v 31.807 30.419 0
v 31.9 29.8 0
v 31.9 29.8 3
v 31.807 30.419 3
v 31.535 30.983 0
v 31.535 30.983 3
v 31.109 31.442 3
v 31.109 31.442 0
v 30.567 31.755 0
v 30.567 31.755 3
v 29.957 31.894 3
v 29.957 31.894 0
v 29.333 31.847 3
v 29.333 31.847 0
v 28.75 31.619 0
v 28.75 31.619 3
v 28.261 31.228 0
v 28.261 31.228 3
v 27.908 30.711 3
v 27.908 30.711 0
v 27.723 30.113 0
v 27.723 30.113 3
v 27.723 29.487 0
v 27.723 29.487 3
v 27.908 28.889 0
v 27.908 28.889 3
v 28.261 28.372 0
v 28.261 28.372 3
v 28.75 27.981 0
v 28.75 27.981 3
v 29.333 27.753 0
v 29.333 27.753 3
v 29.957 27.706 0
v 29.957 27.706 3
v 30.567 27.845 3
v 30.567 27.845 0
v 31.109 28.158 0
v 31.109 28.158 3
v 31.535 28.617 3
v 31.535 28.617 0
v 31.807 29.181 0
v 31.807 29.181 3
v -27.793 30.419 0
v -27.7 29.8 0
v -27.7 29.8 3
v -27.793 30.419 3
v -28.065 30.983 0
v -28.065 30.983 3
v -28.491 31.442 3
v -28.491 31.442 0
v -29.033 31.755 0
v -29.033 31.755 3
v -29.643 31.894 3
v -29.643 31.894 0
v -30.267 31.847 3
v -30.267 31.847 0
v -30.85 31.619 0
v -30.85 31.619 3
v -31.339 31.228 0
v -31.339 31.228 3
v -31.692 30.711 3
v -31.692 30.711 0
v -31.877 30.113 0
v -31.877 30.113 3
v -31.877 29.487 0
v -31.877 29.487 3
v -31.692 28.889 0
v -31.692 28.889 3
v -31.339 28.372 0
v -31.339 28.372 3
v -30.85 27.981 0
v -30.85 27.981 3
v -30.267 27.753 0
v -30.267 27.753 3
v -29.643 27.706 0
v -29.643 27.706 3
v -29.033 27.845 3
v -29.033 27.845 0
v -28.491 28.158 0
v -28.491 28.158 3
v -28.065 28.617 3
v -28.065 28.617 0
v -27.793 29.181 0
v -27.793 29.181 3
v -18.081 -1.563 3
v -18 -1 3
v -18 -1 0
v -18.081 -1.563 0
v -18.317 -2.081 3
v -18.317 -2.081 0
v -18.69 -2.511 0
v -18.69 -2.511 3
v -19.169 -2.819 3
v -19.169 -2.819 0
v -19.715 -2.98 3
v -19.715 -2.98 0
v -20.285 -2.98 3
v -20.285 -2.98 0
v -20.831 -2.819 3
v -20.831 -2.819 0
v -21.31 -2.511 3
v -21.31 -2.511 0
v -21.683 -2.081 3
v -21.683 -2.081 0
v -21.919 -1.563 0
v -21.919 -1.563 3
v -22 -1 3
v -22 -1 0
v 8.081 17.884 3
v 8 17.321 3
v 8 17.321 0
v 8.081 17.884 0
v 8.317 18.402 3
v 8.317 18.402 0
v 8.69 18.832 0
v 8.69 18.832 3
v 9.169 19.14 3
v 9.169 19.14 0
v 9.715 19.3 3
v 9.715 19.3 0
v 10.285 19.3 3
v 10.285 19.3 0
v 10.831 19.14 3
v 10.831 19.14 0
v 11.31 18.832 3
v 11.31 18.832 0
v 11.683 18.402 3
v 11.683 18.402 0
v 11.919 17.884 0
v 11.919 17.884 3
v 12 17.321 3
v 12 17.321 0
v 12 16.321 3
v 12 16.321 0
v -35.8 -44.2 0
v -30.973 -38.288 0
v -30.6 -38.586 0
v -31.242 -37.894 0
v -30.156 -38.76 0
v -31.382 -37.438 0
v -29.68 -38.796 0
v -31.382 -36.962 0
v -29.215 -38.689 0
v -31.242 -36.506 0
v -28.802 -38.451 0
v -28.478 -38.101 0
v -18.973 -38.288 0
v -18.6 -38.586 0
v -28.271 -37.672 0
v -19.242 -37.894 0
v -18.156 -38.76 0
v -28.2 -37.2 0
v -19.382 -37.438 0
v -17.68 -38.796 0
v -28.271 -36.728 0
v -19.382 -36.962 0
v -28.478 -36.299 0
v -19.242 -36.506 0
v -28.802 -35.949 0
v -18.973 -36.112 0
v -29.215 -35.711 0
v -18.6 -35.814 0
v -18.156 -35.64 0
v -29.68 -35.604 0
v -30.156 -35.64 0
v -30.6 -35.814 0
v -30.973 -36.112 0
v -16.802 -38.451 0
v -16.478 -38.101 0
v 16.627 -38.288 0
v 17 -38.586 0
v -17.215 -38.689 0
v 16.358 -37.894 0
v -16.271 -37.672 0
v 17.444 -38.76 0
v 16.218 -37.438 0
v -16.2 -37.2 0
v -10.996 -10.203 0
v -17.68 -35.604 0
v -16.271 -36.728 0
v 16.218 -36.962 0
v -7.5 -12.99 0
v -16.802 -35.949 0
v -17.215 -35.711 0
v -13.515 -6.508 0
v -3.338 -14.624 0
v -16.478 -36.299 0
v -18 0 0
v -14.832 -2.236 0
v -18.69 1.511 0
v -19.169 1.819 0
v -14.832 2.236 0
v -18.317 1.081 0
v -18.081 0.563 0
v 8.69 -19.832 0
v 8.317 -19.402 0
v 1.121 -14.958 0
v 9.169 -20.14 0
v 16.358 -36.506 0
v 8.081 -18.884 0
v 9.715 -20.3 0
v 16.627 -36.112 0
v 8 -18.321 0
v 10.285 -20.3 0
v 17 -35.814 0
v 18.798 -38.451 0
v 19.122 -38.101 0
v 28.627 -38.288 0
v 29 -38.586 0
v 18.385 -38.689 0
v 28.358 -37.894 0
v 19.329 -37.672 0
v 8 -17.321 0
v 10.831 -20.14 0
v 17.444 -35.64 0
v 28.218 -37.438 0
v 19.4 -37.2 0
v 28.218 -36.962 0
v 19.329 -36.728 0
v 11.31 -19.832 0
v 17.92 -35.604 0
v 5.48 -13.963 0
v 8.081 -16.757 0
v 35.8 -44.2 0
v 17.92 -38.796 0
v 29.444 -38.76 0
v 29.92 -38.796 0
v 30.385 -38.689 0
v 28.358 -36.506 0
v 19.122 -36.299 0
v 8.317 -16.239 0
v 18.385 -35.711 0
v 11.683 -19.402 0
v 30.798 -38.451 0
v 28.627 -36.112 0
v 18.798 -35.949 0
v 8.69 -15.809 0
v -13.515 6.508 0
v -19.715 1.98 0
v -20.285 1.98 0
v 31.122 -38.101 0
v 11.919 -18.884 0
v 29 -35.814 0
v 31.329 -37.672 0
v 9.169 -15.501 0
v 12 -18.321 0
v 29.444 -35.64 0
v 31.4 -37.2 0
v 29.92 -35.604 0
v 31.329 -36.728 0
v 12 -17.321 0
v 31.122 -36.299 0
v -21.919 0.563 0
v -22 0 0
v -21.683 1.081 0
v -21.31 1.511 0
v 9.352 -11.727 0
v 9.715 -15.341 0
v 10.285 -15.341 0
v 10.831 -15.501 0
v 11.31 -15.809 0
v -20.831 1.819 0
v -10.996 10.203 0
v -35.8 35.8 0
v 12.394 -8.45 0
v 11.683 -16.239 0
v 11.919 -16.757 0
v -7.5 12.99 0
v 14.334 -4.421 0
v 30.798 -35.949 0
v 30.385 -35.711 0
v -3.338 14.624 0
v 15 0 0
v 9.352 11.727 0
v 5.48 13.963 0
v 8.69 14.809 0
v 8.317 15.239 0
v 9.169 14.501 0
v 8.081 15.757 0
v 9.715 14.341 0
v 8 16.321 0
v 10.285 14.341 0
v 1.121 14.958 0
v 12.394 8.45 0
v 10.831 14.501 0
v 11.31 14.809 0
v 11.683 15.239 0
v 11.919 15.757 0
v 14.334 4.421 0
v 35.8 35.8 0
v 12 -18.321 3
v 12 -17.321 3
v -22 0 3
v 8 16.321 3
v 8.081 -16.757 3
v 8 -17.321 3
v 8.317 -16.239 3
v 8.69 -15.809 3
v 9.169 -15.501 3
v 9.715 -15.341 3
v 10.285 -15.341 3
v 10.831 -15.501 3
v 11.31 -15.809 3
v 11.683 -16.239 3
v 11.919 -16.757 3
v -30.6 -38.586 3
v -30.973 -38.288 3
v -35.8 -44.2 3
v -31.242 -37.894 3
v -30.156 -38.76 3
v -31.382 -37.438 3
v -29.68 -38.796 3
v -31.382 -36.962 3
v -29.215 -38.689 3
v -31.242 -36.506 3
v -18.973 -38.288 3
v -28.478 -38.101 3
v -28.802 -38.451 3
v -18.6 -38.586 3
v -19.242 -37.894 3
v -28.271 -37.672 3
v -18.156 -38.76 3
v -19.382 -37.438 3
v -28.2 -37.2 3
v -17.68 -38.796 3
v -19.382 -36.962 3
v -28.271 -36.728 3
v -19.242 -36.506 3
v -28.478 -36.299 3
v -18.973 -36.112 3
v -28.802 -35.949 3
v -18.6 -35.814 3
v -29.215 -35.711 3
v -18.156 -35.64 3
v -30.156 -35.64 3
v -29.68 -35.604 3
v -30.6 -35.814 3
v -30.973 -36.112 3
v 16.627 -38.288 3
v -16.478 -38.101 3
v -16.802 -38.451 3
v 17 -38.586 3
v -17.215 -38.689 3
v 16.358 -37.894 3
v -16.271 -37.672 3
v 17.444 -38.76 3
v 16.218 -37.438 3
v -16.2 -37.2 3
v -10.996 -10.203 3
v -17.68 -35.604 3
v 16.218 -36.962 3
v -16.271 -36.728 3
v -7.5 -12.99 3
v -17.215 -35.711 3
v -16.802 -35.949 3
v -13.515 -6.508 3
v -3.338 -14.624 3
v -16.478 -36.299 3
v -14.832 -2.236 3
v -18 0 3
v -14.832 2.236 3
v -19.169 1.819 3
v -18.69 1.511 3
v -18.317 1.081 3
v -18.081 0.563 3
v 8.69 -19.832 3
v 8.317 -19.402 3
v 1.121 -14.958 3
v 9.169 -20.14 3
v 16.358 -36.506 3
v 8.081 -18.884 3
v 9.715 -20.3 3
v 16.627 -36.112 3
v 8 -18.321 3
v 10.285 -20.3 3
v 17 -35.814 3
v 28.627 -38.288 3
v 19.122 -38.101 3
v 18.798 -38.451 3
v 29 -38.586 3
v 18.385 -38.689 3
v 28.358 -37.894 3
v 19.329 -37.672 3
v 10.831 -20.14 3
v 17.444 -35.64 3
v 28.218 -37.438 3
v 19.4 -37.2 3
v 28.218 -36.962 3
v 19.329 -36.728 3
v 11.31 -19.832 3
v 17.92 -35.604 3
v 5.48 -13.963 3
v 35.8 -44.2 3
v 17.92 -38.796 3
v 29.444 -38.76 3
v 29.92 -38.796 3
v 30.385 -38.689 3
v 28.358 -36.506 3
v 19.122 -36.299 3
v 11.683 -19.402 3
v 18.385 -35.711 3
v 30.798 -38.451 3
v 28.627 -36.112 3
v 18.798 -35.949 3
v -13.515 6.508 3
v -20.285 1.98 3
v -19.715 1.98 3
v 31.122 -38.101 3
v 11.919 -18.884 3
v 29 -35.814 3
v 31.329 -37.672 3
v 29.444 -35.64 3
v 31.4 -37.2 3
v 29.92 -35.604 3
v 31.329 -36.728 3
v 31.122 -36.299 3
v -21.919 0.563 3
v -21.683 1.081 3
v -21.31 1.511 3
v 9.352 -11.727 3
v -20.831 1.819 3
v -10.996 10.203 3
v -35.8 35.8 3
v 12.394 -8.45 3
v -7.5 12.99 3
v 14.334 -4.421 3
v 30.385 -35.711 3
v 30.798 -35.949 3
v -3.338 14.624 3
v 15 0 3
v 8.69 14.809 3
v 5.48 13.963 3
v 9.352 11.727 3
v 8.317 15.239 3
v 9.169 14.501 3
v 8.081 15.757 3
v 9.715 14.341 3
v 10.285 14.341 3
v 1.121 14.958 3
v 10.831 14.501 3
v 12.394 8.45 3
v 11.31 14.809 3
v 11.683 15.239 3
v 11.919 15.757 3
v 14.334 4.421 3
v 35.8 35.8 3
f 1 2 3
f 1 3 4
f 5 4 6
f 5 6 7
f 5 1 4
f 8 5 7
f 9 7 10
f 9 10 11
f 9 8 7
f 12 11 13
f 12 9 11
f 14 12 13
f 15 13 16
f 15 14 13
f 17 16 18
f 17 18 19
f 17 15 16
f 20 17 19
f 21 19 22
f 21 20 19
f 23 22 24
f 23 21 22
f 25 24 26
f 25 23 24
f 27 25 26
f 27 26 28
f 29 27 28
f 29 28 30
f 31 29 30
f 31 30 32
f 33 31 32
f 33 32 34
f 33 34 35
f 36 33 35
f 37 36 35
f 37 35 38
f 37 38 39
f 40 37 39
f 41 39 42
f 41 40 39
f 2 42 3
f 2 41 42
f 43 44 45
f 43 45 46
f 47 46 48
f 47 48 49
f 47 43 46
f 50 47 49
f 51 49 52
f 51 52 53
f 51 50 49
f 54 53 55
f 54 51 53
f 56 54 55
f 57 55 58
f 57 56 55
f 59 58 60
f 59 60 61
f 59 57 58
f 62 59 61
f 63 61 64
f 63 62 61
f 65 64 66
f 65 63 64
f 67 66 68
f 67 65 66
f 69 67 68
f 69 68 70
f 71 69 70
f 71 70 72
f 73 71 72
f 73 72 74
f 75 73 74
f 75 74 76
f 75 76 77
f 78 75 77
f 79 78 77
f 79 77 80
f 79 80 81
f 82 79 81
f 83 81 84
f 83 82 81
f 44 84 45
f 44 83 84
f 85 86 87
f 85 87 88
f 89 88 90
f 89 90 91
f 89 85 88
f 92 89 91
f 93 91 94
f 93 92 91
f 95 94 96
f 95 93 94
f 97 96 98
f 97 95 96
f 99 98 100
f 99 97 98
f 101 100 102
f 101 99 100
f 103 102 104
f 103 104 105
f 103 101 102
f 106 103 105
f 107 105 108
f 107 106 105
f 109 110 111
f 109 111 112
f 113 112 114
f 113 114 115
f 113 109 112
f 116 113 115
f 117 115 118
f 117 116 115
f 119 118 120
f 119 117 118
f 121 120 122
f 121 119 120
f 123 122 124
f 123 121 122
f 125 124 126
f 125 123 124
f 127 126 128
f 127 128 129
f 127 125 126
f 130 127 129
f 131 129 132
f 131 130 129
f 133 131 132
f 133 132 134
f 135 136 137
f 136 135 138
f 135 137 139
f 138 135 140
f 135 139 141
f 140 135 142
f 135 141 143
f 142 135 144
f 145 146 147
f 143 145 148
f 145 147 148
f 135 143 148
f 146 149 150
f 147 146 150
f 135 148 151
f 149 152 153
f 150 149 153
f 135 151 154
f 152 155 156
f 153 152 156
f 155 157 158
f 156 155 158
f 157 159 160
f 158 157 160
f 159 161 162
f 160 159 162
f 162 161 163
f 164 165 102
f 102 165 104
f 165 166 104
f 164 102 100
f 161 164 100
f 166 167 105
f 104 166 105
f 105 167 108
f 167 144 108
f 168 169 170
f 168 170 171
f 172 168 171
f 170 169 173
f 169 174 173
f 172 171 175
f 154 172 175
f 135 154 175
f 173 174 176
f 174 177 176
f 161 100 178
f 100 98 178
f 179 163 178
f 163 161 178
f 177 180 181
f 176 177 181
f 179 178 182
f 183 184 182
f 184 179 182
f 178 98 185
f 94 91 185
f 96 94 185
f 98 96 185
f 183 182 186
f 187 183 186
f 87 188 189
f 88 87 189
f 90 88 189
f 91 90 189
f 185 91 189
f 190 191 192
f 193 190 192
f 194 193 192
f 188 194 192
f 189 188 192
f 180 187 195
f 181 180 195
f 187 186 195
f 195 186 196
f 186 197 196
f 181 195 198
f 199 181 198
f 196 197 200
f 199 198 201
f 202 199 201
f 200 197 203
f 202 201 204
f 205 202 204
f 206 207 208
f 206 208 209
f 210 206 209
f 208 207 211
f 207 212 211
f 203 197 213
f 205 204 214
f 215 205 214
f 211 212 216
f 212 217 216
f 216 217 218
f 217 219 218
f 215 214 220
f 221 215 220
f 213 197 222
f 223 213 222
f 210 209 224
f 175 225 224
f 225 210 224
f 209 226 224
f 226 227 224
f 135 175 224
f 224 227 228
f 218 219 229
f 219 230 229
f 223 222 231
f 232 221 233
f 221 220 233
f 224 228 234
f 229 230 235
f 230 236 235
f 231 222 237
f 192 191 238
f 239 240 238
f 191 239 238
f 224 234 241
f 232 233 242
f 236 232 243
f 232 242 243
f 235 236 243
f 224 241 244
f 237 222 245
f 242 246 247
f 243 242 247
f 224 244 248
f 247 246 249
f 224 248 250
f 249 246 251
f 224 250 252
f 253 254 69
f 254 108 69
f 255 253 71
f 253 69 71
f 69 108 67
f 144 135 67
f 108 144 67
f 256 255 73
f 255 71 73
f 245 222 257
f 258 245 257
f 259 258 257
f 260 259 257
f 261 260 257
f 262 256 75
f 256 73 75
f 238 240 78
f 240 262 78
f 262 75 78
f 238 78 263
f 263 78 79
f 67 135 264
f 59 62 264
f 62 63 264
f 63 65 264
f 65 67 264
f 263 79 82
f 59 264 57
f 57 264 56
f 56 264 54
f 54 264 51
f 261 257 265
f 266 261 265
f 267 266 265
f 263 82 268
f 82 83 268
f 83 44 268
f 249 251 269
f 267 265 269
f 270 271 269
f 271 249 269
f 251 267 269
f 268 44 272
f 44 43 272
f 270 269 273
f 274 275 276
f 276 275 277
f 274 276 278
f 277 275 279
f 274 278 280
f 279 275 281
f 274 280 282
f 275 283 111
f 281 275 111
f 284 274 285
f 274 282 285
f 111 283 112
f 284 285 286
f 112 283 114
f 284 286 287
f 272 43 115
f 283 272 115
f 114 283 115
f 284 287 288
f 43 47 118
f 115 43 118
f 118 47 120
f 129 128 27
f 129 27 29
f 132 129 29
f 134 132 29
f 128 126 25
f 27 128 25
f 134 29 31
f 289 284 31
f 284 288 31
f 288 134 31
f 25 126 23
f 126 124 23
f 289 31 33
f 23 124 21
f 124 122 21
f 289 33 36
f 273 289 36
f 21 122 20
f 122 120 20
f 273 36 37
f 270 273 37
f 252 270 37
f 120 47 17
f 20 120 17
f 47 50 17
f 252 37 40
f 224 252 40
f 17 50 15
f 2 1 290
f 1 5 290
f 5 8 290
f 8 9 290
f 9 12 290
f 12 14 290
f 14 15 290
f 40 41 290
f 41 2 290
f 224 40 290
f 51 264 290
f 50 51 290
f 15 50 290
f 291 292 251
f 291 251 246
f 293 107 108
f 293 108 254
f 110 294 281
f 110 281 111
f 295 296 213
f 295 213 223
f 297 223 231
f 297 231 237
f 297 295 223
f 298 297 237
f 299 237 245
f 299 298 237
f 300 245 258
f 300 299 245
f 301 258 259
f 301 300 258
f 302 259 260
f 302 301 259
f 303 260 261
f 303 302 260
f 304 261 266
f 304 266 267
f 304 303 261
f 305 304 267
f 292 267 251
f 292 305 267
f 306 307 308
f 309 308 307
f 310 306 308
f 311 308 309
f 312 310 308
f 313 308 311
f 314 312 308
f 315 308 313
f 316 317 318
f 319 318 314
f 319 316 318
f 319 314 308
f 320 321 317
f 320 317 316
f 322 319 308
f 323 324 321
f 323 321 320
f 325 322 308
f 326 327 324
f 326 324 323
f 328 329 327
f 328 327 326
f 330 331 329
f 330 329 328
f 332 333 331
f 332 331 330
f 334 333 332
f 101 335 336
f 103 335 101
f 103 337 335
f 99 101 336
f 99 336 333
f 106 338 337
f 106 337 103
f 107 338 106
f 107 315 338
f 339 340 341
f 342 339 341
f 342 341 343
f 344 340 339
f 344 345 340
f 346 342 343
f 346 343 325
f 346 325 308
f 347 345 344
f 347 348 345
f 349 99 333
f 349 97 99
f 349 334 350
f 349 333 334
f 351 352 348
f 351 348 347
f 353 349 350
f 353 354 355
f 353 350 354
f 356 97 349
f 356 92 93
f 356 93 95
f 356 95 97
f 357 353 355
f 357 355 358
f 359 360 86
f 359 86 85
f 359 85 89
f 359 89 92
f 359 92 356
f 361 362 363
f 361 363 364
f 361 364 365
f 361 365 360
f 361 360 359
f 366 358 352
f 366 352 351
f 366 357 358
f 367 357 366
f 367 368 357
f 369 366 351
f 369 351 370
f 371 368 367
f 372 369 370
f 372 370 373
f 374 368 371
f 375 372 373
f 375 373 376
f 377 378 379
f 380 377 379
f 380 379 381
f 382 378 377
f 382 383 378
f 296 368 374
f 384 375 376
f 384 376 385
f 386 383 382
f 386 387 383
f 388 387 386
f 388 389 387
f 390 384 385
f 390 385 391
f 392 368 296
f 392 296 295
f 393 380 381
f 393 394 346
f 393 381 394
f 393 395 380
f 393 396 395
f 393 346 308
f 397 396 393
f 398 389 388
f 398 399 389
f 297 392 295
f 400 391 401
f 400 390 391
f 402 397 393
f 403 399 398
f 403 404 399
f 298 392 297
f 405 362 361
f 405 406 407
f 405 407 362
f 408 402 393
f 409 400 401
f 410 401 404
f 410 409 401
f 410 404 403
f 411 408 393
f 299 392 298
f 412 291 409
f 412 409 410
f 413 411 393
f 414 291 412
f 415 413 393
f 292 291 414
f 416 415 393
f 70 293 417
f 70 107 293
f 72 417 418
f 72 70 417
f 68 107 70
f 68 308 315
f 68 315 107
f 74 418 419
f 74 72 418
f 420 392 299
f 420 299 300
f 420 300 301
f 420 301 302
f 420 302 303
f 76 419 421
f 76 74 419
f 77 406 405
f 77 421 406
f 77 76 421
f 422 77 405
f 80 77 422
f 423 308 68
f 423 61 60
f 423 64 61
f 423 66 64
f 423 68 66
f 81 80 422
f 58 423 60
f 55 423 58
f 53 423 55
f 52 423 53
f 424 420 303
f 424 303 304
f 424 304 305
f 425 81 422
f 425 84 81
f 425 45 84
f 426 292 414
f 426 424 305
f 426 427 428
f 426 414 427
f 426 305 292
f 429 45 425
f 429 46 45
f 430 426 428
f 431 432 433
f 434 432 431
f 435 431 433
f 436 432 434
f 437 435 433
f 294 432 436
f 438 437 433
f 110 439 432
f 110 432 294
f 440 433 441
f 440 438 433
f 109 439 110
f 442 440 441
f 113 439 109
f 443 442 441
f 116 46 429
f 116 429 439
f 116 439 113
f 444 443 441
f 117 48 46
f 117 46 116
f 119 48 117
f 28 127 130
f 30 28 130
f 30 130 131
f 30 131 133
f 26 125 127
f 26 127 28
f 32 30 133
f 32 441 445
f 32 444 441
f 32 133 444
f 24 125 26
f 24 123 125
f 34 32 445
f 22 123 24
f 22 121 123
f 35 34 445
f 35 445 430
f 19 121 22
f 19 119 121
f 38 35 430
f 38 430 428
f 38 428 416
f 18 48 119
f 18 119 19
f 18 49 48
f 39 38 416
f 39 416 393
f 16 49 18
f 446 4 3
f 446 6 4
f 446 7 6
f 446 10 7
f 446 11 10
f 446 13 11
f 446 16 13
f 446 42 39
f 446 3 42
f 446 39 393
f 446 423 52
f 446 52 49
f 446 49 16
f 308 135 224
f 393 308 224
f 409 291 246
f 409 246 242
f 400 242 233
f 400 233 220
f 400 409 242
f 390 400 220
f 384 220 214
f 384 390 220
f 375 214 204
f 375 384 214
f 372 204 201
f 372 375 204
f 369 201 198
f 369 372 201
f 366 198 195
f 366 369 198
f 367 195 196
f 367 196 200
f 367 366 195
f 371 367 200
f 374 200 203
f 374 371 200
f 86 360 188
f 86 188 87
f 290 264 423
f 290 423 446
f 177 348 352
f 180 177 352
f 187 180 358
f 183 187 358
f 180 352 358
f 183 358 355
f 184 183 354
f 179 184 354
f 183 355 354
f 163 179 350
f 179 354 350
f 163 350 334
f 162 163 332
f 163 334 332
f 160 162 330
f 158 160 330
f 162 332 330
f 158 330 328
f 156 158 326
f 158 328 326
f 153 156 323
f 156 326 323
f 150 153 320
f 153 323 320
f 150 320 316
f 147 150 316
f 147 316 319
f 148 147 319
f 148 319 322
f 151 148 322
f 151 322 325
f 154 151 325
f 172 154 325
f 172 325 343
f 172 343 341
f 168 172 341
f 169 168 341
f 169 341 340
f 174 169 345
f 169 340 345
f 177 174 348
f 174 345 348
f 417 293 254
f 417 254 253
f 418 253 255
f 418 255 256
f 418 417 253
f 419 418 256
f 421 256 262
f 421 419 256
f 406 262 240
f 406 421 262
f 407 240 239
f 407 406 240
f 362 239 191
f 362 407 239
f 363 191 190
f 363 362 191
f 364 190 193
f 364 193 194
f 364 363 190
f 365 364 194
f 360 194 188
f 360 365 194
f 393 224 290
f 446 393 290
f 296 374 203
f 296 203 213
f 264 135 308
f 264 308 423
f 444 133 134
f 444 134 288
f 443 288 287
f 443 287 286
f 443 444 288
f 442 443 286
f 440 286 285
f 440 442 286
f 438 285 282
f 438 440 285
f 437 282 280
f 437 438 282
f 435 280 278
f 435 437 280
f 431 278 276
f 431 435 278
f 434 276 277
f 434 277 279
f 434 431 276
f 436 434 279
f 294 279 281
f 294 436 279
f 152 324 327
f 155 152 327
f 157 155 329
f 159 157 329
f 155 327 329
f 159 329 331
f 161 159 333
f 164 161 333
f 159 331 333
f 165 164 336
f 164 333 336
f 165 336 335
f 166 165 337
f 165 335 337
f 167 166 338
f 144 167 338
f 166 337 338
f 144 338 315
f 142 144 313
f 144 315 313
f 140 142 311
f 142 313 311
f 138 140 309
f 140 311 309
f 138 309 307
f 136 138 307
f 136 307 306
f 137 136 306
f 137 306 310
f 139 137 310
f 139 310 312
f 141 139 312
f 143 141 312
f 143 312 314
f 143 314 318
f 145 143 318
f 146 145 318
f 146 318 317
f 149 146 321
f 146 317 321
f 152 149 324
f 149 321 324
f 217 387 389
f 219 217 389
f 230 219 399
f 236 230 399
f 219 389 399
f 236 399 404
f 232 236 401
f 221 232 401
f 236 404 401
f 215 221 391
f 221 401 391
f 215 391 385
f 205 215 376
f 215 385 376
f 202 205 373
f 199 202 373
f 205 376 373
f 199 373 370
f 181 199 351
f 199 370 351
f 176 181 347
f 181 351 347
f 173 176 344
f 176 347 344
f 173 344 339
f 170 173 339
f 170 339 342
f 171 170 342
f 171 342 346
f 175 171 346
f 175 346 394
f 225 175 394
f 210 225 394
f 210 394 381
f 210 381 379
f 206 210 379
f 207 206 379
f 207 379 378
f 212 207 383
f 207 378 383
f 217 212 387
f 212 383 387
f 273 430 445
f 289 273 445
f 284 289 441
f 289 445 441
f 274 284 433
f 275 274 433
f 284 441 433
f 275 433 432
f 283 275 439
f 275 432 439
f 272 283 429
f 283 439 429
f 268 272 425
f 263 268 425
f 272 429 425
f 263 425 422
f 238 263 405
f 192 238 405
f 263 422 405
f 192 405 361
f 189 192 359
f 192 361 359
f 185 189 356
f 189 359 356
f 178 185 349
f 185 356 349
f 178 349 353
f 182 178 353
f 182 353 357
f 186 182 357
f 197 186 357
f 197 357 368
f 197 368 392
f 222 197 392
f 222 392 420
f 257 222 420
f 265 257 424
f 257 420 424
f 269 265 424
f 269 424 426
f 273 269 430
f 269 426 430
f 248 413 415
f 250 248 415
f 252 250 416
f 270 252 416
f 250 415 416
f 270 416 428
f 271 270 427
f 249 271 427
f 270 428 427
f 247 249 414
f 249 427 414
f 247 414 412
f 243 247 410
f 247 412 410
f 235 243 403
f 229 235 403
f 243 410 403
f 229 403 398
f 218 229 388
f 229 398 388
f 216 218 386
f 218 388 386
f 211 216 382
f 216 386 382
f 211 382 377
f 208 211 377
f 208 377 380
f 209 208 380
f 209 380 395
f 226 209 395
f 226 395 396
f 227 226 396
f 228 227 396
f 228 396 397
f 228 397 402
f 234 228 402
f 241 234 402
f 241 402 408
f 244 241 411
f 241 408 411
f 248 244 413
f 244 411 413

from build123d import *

# Parameters (mm, degrees)
SKETCH_1_W          = 71.6
SKETCH_1_H          = 80
SKETCH_1_R          = 2.1
EXTRUDE_1_DEPTH     = 3
SKETCH_2_R          = 1.6
CUT_EXTRUDE_1_DEPTH = 3
SKETCH_3_R          = 15
CUT_EXTRUDE_2_DEPTH = 3
CUT_EXTRUDE_3_DEPTH = 3


with BuildPart() as part:
    # 草图1 → 凸台-拉伸1 (new body)
    with BuildSketch(Plane.XY):
        with Locations((0, -4.2)):
            Rectangle(SKETCH_1_W, SKETCH_1_H)
        with Locations((-29.8, 29.8)):
            Circle(SKETCH_1_R, mode=Mode.SUBTRACT)
        with Locations((29.8, 29.8)):
            Circle(SKETCH_1_R, mode=Mode.SUBTRACT)
        with BuildLine():
            ThreePointArc((8.833273811, -16.153781887), (8.833273811, -18.487234265), (11.166726189, -18.487234265))
            ThreePointArc((11.166726189, -18.487234265), (11.166726189, -16.153781887), (8.833273811, -16.153781887))
        make_face(mode=Mode.SUBTRACT)
        with BuildLine():
            ThreePointArc((-21.166726189, 1.166726189), (-21.166726189, -1.166726189), (-18.833273811, -1.166726189))
            ThreePointArc((-18.833273811, -1.166726189), (-18.833273811, 1.166726189), (-21.166726189, 1.166726189))
        make_face(mode=Mode.SUBTRACT)
        with BuildLine():
            ThreePointArc((8.833273811, 18.487234265), (8.833273811, 16.153781887), (11.166726189, 16.153781887))
            ThreePointArc((11.166726189, 16.153781887), (11.166726189, 18.487234265), (8.833273811, 18.487234265))
        make_face(mode=Mode.SUBTRACT)
    extrude(amount=EXTRUDE_1_DEPTH)

    # 草图2 → 切除-拉伸1 (cut)
    with BuildSketch(Plane.XY.offset(3)):
        with Locations((29.8, -37.2)):
            Circle(SKETCH_2_R)
        with Locations((17.8, -37.2)):
            Circle(SKETCH_2_R)
        with Locations((-17.8, -37.2)):
            Circle(SKETCH_2_R)
        with Locations((-29.8, -37.2)):
            Circle(SKETCH_2_R)
    extrude(amount=-CUT_EXTRUDE_1_DEPTH, mode=Mode.SUBTRACT)

    # 草图3 → 切除-拉伸2 (cut)
    with BuildSketch(Plane.XY.offset(3)):
        Circle(SKETCH_3_R)
    extrude(amount=-CUT_EXTRUDE_2_DEPTH, mode=Mode.SUBTRACT)

    # 草图4 → 切除-拉伸3 (cut)
    with BuildSketch(Plane.XY.offset(3)):
        with BuildLine():
            Line((12, 17.320508076), (12, 16.320508076))
            ThreePointArc((12, 16.320508076), (10, 14.320508076), (8, 16.320508076))
            Line((8, 16.320508076), (8, 17.320508076))
            ThreePointArc((8, 17.320508076), (10, 19.320508076), (12, 17.320508076))
        make_face()
        with BuildLine():
            Line((-18, 0), (-18, -1))
            ThreePointArc((-18, -1), (-20, -3), (-22, -1))
            Line((-22, -1), (-22, 0))
            ThreePointArc((-22, 0), (-20, 2), (-18, 0))
        make_face()
        with BuildLine():
            Line((12, -17.320508076), (12, -18.320508076))
            ThreePointArc((12, -18.320508076), (10, -20.320508076), (8, -18.320508076))
            Line((8, -18.320508076), (8, -17.320508076))
            ThreePointArc((8, -17.320508076), (10, -15.320508076), (12, -17.320508076))
        make_face()
    extrude(amount=-CUT_EXTRUDE_3_DEPTH, mode=Mode.SUBTRACT)


solid = part.part
